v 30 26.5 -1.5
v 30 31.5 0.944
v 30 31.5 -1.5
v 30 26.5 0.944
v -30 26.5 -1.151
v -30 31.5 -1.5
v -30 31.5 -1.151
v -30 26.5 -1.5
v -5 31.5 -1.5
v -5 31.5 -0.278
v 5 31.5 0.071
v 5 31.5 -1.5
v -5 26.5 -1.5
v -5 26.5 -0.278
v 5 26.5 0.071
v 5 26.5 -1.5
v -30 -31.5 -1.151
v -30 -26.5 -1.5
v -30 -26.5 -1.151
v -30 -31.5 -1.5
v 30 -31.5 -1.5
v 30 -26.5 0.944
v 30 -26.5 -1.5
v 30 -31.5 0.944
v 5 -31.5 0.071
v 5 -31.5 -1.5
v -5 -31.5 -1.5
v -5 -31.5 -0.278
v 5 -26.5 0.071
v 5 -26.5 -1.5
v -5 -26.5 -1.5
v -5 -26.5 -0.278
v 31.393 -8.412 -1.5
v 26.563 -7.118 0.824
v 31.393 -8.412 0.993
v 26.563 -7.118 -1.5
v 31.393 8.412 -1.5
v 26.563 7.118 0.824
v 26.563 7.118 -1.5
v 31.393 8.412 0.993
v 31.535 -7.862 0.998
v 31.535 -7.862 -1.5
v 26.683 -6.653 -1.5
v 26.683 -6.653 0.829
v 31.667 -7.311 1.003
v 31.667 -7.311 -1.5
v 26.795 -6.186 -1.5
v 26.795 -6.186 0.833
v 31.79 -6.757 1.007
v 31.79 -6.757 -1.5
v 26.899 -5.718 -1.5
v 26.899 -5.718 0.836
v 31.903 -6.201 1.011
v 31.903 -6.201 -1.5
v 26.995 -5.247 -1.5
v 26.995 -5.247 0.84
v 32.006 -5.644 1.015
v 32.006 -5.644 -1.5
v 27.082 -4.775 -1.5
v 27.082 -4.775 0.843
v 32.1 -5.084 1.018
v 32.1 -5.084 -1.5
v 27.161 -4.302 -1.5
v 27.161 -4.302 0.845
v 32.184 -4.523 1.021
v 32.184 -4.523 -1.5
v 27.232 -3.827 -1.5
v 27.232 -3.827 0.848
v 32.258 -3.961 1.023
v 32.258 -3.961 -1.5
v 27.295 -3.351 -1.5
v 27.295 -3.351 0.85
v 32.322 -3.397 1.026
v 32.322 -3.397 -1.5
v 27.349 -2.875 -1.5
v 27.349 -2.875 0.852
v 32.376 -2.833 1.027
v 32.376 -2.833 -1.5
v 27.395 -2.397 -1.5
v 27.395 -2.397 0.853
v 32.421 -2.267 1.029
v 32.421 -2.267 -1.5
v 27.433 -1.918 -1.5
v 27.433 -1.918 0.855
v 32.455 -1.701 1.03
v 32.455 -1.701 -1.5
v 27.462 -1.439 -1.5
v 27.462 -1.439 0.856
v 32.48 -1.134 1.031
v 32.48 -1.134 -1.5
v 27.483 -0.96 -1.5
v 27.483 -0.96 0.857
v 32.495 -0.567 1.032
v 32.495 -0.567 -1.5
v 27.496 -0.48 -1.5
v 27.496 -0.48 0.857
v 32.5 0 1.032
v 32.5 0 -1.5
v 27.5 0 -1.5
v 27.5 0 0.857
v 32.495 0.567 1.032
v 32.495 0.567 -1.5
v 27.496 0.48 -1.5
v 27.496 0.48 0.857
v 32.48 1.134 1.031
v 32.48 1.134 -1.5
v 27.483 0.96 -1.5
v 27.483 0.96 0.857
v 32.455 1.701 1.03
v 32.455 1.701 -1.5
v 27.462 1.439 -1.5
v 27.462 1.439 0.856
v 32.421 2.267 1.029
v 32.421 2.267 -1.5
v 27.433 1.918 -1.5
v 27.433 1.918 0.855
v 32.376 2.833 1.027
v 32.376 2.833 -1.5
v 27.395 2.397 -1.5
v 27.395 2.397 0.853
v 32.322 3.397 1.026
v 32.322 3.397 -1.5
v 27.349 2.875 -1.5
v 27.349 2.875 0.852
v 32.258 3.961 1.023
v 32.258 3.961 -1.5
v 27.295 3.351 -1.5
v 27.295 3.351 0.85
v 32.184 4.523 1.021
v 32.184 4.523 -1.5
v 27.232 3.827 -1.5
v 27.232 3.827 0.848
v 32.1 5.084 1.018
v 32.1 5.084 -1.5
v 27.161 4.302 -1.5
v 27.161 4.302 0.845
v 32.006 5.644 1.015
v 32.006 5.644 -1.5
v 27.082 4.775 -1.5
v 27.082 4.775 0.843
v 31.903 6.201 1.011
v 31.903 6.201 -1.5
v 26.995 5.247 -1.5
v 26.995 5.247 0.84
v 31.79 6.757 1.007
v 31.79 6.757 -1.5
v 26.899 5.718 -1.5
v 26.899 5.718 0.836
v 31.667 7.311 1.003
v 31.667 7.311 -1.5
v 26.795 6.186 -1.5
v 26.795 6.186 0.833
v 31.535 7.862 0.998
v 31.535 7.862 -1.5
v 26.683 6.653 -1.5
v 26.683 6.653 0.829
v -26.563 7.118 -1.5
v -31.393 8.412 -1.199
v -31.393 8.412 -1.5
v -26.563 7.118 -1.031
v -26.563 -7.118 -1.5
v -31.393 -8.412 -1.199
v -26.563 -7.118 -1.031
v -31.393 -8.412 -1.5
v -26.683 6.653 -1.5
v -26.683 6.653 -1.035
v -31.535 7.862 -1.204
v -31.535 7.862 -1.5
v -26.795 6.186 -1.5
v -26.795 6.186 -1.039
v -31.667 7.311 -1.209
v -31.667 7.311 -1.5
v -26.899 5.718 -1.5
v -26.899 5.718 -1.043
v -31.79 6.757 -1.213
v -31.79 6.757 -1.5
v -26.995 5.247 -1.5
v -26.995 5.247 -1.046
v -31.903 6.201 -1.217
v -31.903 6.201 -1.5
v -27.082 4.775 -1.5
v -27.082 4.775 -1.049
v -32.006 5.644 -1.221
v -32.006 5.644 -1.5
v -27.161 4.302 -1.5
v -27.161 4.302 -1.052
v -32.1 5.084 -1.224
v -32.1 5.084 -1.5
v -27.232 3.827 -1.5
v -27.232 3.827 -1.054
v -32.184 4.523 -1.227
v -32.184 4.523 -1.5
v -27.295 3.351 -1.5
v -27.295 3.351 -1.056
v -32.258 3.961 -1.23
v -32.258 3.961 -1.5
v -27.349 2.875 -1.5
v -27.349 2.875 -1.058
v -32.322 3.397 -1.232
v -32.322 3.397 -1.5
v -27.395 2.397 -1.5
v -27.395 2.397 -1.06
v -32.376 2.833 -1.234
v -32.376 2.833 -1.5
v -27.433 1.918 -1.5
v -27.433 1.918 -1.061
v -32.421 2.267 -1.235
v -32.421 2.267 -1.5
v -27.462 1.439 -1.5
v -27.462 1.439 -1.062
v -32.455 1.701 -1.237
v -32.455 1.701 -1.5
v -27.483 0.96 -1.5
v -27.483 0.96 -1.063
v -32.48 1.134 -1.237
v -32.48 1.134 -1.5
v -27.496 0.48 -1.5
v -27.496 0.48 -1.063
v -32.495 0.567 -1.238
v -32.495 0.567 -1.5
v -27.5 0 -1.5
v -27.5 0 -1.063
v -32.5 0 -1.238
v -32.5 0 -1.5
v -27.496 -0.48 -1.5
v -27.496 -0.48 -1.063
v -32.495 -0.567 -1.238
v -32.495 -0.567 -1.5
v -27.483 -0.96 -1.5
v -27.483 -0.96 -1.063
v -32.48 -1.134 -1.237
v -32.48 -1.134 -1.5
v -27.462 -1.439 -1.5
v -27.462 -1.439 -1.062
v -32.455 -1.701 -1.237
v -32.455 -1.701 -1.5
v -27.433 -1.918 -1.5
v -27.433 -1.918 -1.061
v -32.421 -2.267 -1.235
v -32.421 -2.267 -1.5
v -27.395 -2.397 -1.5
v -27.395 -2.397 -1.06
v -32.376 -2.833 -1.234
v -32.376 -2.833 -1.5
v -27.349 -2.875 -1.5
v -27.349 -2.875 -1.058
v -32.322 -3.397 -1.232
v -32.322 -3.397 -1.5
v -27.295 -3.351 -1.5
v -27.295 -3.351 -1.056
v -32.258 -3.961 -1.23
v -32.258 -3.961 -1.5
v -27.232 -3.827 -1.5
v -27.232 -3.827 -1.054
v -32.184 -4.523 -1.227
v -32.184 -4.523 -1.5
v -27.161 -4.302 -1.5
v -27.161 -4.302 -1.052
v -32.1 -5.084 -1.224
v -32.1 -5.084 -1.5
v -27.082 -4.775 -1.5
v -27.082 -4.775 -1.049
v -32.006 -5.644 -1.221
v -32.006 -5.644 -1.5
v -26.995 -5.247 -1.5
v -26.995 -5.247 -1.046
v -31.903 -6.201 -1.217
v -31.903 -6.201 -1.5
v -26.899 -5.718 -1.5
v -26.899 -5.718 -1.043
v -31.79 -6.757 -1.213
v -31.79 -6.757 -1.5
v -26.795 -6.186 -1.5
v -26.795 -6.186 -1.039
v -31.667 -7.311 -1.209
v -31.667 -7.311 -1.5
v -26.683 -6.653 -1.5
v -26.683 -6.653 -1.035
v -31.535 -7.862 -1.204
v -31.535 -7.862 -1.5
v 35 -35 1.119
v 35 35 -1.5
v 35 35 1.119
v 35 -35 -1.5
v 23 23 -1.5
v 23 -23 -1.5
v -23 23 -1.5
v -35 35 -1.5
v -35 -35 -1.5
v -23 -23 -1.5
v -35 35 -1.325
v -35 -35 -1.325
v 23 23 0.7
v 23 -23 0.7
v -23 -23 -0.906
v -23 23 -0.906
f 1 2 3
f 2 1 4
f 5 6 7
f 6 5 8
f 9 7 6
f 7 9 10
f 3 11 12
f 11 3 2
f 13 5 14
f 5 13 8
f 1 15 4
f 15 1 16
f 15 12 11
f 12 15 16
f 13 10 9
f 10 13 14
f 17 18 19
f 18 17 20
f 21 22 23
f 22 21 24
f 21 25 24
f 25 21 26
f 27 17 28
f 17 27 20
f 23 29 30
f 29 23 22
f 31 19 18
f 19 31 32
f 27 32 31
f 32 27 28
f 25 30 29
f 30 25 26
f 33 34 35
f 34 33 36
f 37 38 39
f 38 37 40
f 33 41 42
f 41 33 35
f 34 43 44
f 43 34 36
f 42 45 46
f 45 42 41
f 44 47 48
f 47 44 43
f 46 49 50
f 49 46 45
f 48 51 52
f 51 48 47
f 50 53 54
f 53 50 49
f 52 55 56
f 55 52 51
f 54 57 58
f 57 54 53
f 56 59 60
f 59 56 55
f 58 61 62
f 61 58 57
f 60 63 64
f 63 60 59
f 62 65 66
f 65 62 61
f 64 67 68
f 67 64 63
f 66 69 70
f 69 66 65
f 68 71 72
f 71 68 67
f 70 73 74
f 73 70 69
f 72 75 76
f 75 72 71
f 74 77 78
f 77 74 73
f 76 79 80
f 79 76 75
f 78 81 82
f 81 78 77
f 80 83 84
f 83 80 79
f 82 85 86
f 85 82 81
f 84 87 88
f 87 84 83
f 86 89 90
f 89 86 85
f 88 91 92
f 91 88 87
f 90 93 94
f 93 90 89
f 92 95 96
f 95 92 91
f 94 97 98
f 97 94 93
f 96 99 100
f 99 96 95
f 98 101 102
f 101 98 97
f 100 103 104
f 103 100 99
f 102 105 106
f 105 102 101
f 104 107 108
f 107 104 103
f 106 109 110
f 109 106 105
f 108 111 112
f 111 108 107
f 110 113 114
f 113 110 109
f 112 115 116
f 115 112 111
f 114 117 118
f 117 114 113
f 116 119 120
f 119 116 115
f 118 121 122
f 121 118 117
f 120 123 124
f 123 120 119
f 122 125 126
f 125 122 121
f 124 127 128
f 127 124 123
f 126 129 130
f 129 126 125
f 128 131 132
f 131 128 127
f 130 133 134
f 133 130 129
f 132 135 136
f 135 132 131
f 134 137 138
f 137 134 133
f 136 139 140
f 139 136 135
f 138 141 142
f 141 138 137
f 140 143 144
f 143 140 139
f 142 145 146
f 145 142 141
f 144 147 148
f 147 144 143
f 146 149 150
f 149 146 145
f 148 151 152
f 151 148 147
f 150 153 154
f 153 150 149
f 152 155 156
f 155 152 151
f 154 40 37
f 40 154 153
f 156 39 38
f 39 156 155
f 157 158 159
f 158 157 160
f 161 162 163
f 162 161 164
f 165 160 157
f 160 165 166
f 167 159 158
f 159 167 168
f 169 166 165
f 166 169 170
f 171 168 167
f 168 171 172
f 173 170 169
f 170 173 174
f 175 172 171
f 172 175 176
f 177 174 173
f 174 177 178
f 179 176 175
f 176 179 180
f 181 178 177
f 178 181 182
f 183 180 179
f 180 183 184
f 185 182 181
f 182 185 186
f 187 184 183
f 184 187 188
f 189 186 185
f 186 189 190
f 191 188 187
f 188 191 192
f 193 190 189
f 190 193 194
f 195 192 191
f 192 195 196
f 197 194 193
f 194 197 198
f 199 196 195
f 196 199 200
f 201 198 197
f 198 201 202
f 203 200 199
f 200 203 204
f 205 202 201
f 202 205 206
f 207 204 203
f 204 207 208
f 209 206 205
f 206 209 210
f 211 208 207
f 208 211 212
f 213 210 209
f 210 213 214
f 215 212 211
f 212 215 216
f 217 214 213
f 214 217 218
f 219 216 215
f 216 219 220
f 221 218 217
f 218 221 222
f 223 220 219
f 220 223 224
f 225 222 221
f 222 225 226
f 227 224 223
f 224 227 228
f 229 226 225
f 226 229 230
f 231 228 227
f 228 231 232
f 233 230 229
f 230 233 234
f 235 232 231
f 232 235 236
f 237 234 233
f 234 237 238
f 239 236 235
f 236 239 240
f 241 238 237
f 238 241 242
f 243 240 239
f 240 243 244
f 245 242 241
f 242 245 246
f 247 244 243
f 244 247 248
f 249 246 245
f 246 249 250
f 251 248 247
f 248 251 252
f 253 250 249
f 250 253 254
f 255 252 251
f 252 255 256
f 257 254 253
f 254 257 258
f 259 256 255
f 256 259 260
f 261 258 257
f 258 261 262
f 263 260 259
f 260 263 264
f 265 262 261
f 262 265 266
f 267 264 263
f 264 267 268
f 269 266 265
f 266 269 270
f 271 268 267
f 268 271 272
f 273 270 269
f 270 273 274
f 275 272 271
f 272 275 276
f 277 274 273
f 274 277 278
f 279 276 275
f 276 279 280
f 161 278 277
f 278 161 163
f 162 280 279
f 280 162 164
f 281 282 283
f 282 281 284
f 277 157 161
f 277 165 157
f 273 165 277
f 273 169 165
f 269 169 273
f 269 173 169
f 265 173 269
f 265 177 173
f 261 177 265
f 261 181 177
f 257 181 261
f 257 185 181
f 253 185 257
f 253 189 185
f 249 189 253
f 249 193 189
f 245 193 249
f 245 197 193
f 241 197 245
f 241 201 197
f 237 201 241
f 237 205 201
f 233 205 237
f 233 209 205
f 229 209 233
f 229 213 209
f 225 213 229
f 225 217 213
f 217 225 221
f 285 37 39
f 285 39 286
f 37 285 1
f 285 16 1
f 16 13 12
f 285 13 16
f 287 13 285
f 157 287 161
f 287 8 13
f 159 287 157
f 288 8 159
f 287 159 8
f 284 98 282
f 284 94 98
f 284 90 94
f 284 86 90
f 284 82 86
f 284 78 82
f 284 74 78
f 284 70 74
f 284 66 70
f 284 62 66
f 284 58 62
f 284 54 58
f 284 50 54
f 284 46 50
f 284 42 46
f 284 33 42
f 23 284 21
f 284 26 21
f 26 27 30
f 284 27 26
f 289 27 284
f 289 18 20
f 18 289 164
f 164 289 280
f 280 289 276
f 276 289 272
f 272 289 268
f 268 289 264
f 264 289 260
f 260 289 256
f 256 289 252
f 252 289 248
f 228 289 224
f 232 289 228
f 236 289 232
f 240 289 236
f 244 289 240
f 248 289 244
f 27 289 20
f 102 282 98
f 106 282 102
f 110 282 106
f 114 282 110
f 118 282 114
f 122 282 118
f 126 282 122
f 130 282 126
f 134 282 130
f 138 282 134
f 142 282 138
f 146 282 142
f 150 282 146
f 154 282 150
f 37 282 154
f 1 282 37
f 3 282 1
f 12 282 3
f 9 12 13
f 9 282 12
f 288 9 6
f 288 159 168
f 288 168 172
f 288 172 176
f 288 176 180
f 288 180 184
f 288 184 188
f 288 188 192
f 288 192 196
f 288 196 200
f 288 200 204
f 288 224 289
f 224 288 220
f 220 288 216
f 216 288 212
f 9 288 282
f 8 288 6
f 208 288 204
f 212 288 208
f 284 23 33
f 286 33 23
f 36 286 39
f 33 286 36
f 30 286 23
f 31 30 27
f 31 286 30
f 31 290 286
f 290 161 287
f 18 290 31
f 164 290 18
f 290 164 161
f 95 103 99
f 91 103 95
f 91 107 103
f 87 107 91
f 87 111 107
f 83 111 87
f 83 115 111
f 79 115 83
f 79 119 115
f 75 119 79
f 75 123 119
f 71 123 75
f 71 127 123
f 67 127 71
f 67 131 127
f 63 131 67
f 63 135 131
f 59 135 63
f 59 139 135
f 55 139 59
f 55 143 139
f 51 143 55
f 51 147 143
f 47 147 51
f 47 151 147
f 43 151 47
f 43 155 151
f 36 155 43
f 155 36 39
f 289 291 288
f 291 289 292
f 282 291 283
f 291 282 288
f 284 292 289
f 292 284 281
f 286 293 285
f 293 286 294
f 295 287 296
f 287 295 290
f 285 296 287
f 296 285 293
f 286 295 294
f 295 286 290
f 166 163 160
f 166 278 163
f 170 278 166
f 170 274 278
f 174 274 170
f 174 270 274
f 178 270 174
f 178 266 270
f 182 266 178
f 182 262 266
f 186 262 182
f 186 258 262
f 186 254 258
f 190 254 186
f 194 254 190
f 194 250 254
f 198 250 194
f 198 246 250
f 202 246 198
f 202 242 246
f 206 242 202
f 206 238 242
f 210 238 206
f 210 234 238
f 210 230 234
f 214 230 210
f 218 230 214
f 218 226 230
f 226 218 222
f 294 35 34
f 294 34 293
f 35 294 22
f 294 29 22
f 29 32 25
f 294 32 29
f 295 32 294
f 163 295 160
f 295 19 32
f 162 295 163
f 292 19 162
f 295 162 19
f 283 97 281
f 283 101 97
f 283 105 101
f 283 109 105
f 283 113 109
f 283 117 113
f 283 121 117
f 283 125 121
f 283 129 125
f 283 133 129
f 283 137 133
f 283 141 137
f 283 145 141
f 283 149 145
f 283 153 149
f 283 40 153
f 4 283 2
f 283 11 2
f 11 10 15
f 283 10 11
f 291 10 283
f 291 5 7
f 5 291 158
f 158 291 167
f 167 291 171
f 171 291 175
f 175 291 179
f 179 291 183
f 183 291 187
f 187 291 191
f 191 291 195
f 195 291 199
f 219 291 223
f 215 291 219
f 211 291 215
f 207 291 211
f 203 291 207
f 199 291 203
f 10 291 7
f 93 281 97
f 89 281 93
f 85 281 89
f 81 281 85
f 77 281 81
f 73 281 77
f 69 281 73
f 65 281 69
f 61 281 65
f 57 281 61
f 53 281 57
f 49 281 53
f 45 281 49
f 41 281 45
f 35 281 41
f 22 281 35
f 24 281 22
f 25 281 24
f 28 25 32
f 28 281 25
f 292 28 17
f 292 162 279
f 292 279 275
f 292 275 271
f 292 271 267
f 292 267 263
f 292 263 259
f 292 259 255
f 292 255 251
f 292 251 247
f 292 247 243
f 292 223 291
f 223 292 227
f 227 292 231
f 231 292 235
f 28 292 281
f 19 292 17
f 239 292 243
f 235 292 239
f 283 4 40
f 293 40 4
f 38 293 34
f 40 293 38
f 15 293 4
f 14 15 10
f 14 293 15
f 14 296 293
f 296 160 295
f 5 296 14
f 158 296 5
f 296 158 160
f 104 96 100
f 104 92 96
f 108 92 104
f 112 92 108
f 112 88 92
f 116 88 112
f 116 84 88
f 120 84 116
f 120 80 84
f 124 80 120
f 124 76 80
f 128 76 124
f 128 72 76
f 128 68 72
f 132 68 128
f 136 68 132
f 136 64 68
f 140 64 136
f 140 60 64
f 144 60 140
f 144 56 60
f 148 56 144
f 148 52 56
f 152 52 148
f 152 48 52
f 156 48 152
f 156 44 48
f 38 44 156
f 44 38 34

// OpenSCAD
h=3;
alpha=15;

module side_hole() {
    translate([0, 29, 0]) {
        difference() {
            cube([60,5,h+2], center=true);
            cube([10,5,h+2], center=true);
        }
    }
}

difference() {
    cube([70,70,h], center=true);
    cube([46,46,h+1], center=true);
    side_hole();
    rotate([0,0,180])side_hole();
    rotate([0,0,-alpha]) {
        rotate_extrude(angle=2*alpha, $fn=360) translate([30,0]) square(5, center= true);
        rotate_extrude(angle=2*alpha, $fn=360) translate([-30,0]) square(5, center= true);
    }
    translate([-40, -40, -h/2]) rotate([0,-2,0]) cube([80,80,2*h]);
}
